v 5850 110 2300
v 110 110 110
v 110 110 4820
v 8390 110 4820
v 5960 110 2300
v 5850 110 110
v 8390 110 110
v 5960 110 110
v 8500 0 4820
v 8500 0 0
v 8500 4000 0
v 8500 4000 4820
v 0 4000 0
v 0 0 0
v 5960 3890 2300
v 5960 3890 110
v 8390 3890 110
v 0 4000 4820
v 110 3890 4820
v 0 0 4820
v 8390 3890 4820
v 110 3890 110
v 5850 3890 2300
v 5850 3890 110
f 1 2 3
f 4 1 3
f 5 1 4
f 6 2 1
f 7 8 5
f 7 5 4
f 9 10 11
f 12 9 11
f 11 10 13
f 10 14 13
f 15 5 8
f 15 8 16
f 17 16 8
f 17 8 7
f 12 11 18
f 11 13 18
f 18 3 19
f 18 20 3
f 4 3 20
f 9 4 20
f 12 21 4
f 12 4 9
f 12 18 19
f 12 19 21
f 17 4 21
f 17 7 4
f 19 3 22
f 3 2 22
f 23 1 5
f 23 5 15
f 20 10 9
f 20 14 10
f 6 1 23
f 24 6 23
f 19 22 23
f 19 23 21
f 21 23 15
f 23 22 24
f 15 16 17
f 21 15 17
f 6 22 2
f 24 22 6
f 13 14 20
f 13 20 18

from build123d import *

# Parameters (mm, degrees)
F0_W     = 8500
F0_H     = 4000
F1_DEPTH = 4820
F2_T     = -110
F6_W     = 4000
F6_H     = 2300
F7_DEPTH = 110


with BuildPart() as f1:
    # F0 (on Top) → F1 (new body)
    with BuildSketch(Plane.XY):
        with Locations((4250, 2000)):
            Rectangle(F0_W, F0_H)
    extrude(amount=F1_DEPTH)

    # F2
    f2_openings = [f1.faces().sort_by_distance(p)[0] for p in [
        (4250, 2000, 4820),
    ]]
    offset(amount=F2_T, openings=f2_openings)

    # F6 (on offset) → F7 (join)
    with BuildSketch(Plane.YZ.offset(5850)):
        with Locations((2000, 1150)):
            Rectangle(F6_W, F6_H)
    extrude(amount=F7_DEPTH)


solid = f1.part
